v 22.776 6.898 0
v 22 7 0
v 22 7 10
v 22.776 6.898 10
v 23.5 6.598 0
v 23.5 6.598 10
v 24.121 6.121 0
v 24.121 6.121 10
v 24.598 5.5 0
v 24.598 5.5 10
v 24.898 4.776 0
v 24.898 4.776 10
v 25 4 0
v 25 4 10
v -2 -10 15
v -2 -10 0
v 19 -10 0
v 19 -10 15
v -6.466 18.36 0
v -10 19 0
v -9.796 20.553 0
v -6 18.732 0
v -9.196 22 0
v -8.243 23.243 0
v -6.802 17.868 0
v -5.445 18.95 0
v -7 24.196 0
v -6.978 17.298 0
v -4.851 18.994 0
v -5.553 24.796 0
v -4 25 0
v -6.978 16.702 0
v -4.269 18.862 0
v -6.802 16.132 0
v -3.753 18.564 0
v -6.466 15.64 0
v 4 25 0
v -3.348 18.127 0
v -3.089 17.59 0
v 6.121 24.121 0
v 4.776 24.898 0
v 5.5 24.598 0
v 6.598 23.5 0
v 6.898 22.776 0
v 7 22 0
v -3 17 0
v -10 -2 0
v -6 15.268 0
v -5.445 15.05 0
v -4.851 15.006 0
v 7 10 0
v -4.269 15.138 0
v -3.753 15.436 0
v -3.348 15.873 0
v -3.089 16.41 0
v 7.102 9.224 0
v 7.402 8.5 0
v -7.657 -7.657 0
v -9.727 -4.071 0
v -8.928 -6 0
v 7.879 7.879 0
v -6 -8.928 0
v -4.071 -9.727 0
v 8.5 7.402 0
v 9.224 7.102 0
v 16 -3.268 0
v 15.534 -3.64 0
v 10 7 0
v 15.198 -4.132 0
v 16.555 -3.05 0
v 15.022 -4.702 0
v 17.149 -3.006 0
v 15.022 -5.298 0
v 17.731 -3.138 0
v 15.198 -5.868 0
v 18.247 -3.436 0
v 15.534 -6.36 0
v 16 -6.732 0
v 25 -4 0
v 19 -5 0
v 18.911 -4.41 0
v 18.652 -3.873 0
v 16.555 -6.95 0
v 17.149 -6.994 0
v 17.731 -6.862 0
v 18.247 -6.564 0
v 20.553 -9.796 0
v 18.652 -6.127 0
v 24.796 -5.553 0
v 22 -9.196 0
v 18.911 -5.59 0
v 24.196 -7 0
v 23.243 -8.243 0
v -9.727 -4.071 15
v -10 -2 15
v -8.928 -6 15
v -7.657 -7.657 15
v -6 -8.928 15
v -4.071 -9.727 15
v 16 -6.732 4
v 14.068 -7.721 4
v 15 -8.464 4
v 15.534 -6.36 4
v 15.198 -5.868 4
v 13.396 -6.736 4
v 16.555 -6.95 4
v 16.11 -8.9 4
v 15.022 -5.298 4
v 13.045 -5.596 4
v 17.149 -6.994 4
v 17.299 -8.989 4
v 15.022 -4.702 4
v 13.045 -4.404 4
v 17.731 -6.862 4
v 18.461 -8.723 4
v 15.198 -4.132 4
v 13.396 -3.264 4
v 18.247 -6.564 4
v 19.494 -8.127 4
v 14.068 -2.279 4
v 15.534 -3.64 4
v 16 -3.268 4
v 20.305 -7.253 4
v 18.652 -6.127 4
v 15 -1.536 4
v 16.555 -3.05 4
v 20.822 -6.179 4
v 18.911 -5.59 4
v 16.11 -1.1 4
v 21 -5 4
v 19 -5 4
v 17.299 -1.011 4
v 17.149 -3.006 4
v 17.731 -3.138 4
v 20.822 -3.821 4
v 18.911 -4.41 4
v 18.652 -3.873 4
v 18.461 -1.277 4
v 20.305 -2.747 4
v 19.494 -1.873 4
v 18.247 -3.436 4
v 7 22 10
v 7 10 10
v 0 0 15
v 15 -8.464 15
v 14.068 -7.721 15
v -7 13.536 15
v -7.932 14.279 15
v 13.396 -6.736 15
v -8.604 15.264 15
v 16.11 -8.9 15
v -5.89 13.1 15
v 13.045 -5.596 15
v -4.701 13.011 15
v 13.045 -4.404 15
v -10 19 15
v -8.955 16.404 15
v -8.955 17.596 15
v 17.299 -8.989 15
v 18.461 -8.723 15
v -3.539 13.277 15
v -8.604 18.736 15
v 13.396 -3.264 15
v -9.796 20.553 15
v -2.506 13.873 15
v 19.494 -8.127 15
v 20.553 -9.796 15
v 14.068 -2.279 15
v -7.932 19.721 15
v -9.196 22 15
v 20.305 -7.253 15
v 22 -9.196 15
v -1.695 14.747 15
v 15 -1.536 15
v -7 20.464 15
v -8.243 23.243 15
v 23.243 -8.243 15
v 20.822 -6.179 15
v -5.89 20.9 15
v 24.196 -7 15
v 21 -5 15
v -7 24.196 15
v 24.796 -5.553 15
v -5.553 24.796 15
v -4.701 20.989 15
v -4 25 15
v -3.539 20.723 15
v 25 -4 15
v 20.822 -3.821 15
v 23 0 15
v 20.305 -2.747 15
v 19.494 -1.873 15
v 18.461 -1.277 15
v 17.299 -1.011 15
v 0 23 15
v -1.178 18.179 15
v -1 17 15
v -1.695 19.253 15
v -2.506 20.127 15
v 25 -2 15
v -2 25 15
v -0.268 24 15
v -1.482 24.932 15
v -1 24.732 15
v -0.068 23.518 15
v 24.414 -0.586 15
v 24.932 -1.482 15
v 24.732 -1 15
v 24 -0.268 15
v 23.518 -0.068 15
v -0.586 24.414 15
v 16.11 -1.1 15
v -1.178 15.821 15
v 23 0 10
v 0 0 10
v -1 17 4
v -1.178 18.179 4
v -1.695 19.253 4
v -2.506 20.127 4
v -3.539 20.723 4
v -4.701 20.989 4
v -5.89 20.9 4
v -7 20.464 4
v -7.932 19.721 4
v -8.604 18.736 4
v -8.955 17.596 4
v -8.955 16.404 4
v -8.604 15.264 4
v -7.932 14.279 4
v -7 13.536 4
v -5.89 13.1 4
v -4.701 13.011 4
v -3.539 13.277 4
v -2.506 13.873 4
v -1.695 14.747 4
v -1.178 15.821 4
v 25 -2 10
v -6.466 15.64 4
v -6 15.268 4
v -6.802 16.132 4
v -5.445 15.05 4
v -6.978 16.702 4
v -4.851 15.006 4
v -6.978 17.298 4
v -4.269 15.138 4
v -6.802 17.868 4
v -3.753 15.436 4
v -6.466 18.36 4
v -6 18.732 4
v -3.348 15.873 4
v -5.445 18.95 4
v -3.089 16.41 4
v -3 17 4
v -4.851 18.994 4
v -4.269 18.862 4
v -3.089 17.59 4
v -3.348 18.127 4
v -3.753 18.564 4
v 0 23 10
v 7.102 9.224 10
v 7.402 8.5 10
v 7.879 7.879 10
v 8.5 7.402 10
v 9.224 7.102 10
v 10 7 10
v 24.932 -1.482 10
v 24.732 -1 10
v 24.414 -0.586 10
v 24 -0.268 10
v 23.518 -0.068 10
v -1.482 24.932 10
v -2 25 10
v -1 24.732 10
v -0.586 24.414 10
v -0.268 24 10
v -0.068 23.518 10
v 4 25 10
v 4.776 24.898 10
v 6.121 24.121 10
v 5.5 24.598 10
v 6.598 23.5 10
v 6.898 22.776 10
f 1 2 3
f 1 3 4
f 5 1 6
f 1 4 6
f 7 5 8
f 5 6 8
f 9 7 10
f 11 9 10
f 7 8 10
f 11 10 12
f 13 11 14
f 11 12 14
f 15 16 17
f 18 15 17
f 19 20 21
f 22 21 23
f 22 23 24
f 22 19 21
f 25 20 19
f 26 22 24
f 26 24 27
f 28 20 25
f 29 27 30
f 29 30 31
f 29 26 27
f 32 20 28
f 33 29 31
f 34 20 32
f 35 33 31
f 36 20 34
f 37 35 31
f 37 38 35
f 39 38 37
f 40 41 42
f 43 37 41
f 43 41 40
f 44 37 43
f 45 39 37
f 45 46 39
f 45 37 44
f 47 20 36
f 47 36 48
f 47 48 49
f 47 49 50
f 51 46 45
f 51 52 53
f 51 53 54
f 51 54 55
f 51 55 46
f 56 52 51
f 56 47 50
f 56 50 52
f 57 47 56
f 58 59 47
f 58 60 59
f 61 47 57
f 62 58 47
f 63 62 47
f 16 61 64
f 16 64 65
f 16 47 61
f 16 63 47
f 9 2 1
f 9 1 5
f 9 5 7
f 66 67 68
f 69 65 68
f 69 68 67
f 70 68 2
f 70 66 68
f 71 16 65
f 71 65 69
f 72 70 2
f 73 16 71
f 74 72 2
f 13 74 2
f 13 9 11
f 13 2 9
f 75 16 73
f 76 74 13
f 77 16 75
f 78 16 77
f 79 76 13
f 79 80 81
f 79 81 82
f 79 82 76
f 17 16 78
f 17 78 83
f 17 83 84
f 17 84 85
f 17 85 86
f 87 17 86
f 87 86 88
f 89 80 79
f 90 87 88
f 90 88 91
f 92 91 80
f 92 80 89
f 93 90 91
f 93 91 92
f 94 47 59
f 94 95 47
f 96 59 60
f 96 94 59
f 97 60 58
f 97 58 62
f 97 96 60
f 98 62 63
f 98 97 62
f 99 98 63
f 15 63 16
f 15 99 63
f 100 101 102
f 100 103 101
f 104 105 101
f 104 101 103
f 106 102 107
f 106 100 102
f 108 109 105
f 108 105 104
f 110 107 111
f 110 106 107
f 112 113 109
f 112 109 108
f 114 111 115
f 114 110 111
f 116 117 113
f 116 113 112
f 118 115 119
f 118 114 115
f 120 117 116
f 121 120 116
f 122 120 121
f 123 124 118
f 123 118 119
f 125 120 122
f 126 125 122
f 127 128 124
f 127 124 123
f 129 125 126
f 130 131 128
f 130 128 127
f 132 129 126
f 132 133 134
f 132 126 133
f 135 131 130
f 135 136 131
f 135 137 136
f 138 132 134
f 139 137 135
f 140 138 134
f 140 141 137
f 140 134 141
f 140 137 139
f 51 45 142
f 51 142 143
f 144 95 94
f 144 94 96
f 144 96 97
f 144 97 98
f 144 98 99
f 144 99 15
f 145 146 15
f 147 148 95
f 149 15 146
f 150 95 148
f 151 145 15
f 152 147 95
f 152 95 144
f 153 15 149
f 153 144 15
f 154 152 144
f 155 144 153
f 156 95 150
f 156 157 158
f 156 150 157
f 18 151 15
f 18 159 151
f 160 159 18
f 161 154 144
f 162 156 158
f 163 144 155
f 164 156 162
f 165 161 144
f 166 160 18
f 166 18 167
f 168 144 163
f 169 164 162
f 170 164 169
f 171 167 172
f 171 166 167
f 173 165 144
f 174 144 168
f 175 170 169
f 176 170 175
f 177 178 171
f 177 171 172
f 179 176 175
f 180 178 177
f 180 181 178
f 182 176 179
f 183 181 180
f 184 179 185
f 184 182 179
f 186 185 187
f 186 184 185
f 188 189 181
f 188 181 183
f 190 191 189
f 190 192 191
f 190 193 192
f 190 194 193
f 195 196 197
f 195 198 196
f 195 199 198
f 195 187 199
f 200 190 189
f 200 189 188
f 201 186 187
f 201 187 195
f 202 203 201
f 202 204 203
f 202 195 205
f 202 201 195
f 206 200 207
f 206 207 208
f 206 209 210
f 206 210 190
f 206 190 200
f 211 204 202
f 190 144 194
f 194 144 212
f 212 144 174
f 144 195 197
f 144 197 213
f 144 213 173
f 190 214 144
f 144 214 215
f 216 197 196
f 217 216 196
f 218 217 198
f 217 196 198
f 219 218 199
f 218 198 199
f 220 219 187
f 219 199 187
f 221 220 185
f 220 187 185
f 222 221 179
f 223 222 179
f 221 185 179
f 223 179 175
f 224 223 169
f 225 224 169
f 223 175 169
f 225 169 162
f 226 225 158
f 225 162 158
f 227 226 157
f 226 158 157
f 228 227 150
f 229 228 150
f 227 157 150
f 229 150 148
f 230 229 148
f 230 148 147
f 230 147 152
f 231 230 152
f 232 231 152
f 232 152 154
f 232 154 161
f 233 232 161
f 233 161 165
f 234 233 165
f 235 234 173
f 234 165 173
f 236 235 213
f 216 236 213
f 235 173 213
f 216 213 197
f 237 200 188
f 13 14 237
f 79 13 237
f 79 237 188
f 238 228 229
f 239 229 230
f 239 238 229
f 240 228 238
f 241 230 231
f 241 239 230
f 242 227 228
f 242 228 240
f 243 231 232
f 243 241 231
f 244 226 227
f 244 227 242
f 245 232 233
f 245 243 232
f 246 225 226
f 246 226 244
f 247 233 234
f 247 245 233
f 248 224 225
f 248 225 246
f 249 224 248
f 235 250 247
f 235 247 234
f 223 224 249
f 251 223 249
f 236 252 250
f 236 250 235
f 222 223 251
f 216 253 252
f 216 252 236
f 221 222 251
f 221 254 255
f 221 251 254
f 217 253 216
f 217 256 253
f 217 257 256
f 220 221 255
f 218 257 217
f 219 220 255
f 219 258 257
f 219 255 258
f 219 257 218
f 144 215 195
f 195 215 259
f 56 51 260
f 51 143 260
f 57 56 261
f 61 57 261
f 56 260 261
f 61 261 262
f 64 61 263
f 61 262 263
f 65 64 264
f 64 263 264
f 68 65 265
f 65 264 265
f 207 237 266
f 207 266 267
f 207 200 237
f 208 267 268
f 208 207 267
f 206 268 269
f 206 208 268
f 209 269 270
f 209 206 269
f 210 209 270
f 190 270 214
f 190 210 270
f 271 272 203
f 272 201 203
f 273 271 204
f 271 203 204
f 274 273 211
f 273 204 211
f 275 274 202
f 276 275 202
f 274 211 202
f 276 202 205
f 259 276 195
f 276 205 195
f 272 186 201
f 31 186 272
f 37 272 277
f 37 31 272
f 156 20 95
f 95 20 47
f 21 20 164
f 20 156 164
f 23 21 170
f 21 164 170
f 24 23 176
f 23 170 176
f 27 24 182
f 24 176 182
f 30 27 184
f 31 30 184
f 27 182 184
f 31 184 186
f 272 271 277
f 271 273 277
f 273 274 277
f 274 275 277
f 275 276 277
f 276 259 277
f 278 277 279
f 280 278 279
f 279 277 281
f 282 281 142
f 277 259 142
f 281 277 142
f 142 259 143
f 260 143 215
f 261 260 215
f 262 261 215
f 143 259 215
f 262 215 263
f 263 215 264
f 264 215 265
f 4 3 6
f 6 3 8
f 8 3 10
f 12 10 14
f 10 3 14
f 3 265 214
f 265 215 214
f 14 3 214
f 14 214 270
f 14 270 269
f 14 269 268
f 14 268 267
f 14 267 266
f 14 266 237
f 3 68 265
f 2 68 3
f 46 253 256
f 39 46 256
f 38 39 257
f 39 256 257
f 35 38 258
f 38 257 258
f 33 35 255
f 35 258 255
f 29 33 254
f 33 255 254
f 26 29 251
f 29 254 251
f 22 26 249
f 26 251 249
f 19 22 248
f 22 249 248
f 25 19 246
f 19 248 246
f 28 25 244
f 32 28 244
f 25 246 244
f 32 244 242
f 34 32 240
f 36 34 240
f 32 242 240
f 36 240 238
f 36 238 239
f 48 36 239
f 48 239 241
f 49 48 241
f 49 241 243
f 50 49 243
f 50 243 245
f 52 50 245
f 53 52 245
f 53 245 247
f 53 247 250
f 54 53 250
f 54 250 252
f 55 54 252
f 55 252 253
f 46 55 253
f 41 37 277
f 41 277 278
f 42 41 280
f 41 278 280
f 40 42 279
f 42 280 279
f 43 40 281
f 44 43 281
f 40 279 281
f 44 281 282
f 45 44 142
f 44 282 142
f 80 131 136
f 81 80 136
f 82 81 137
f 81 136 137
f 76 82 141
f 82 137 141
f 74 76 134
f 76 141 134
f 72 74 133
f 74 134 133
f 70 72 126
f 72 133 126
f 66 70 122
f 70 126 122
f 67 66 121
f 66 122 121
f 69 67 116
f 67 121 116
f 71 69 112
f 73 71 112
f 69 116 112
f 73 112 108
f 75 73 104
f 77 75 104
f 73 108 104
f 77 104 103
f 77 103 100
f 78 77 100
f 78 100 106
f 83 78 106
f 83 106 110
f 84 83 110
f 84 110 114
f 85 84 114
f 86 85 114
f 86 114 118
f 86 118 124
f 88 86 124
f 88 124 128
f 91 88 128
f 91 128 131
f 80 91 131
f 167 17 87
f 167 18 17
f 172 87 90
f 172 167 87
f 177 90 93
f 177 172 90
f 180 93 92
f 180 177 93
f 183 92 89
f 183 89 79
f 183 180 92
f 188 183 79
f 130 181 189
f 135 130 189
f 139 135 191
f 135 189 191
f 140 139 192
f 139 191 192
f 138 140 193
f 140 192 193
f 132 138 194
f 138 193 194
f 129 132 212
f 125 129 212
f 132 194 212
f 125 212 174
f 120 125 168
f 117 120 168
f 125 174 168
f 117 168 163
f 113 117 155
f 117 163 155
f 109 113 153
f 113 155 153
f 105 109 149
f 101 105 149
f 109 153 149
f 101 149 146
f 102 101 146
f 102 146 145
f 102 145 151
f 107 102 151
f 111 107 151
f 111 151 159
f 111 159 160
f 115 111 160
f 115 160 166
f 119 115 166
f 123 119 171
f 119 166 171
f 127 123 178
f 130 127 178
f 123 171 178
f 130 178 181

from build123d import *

# Parameters (mm, degrees)
F1_DEPTH = 15
F3_DEPTH = 10
F4_R     = 2
F5_DEPTH = 25
F6_R     = 4
F7_DEPTH = 11
F8_R     = 8
F9_R     = 6
F10_R    = 3
F11_R    = 2


with BuildPart() as f1:
    # F0 (on Top) → F1 (new body)
    with BuildSketch(Plane.XY):
        Polygon((25, 0), (0, 0), (0, 25), (-10, 25), (-10, -10), (25, -10), align=None)
    extrude(amount=F1_DEPTH)

    # F2 (on face) → F3 (join)
    with BuildSketch(Plane(origin=(0, 0, 0), x_dir=(1, 0, 0), z_dir=(0, 0, -1))):
        Polygon((25, 0), (0, 0), (0, -25), (7, -25), (7, -7), (25, -7), align=None)
    extrude(amount=-F3_DEPTH)

    # F4 (on face) → F5 (cut)
    with BuildSketch(Plane.XY.offset(15)):
        with Locations((17, -5)):
            Circle(F4_R)
        with Locations((-5, 17)):
            Circle(F4_R)
    extrude(amount=-F5_DEPTH, mode=Mode.SUBTRACT)

    # F6 (on face) → F7 (cut)
    with BuildSketch(Plane.XY.offset(15)):
        with Locations((17, -5)):
            Circle(F6_R)
        with Locations((-5, 17)):
            Circle(F6_R)
    extrude(amount=-F7_DEPTH, mode=Mode.SUBTRACT)

    # F8
    f8_edges = [f1.edges().sort_by_distance(p)[0] for p in [
        (-10, -10, 7.5),
    ]]
    fillet(f8_edges, radius=F8_R)

    # F9
    f9_edges = [f1.edges().sort_by_distance(p)[0] for p in [
        (25, -10, 7.5),
        (-10, 25, 7.5),
    ]]
    fillet(f9_edges, radius=F9_R)

    # F10
    f10_edges = [f1.edges().sort_by_distance(p)[0] for p in [
        (25, 7, 5),
        (7, 7, 5),
        (7, 25, 5),
    ]]
    fillet(f10_edges, radius=F10_R)

    # F11
    f11_edges = [f1.edges().sort_by_distance(p)[0] for p in [
        (25, 0, 12.5),
        (0, 25, 12.5),
    ]]
    fillet(f11_edges, radius=F11_R)


solid = f1.part
